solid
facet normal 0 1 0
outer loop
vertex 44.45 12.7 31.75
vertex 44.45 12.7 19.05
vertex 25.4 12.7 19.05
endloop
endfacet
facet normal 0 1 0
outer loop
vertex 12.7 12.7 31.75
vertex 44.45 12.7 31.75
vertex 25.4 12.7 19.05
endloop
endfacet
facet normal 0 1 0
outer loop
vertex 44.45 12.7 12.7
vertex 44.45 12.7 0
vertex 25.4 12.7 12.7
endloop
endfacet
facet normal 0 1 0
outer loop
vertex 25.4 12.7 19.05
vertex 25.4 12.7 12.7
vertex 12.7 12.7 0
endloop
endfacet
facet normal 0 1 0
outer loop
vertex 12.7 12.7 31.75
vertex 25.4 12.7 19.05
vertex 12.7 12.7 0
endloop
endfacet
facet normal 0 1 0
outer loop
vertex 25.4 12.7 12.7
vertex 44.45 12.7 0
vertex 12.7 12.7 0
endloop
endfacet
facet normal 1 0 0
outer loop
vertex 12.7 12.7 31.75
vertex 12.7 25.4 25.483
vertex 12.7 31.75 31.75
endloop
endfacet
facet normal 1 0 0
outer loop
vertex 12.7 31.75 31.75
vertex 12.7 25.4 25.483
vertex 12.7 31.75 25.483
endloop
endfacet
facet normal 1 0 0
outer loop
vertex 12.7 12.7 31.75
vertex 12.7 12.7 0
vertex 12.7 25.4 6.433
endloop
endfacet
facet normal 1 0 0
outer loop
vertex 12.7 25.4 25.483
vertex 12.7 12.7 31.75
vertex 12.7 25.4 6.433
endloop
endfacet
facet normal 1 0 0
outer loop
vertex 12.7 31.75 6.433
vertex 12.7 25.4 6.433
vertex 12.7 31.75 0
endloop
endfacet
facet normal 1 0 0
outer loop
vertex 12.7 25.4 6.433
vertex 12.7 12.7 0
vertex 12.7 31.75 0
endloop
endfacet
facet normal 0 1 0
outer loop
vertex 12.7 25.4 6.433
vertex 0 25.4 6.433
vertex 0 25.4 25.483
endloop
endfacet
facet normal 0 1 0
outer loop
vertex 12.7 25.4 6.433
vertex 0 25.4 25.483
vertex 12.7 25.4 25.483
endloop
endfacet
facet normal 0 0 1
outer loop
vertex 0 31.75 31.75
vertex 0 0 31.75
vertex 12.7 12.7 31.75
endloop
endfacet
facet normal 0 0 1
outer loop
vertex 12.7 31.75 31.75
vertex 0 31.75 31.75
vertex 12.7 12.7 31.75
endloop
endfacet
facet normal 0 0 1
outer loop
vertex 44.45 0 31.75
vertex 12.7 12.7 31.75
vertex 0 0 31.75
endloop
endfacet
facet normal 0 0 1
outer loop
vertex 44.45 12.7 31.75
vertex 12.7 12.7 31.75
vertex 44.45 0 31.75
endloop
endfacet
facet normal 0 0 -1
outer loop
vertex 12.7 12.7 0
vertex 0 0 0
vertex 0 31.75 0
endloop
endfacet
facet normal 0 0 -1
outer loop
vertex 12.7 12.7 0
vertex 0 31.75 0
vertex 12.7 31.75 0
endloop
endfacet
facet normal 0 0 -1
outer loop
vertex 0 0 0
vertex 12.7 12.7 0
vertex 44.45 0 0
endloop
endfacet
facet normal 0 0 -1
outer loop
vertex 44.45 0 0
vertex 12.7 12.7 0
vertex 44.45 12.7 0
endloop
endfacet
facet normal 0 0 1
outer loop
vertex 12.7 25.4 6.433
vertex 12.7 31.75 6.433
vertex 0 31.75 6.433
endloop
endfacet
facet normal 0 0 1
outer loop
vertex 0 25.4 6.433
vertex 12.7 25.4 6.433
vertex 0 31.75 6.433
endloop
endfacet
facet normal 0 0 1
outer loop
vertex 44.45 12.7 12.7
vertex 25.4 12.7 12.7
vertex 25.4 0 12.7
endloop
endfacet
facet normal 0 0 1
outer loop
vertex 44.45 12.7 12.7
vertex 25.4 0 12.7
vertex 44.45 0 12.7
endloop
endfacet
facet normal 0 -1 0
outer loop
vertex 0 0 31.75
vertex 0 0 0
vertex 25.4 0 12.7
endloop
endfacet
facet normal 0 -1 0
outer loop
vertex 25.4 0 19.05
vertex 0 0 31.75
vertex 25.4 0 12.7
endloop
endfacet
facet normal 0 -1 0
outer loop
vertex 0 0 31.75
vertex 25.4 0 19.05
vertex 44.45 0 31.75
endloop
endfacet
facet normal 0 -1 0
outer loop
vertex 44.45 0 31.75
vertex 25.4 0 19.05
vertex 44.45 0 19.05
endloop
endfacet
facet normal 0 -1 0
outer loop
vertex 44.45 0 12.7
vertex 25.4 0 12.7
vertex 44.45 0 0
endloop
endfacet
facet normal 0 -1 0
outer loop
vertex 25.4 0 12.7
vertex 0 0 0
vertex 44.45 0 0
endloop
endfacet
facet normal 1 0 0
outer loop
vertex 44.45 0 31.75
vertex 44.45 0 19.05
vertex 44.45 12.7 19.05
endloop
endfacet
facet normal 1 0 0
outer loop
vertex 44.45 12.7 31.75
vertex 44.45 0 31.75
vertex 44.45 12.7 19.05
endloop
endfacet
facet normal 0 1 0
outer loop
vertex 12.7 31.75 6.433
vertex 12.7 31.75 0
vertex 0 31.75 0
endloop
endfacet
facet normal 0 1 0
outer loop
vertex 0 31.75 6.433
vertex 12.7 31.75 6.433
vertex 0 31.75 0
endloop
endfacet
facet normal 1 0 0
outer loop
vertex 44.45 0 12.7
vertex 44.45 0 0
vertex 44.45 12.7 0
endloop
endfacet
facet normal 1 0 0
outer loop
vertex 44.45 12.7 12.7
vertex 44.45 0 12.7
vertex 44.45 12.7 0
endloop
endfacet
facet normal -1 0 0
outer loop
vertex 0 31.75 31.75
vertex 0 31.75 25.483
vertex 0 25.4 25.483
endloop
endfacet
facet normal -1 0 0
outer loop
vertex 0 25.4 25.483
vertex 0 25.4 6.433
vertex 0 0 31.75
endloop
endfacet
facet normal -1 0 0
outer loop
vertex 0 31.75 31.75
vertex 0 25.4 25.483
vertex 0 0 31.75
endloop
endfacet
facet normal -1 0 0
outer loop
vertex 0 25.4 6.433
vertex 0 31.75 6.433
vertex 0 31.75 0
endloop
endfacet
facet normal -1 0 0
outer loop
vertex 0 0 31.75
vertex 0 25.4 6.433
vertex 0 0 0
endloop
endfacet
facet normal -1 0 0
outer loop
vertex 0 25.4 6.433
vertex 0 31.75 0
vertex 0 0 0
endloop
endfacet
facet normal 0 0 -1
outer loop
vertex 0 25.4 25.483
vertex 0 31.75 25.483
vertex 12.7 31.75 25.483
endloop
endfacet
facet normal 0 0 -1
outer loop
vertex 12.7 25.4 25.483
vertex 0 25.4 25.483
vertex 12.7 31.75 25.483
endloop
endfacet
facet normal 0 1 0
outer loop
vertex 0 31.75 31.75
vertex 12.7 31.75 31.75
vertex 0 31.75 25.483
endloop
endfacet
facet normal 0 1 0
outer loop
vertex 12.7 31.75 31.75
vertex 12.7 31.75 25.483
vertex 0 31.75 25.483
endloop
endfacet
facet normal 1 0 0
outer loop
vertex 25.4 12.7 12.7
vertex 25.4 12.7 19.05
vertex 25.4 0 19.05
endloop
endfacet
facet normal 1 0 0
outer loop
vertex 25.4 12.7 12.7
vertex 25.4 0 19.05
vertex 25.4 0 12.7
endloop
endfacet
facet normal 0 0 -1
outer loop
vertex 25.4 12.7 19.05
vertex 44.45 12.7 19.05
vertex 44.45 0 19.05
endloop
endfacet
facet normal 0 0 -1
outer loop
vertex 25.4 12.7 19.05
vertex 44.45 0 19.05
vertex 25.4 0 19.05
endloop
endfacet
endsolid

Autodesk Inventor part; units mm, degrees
ref_plane "YZ Plane" through (0, 0, 0) normal (1, 0, 0) x (0, 1, 0)
ref_plane "XZ Plane" through (0, 0, 0) normal (0, 1, 0) x (-1, 0, 0)
ref_plane "XY Plane" through (0, 0, 0) normal (0, 0, 1) x (1, 0, 0)
sketch "Sketch1" plane through (0, 0, 0) normal (0, 0, 1) x (1, 0, 0)
  line L0 (0, 0) -> (44.45, 0)
  line L1 (44.45, 0) -> (44.45, 12.7)
  line L2 (44.45, 12.7) -> (12.7, 12.7)
  line L3 (12.7, 12.7) -> (12.7, 31.75)
  line L4 (12.7, 31.75) -> (0, 31.75)
  line L5 (0, 31.75) -> (0, 0)
  dimension "d0" = 44.45
  dimension "d1" = 12.7
  dimension "d2" = 31.75
  dimension "d3" = 19.05
extrude "Extrusion1" add sketch "Sketch1" along normal blind 31.75
sketch "Sketch2" plane through (0, 31.75, 0) normal (0, 1, 0) x (1, 0, 0)
  line L0 (0, -31.8326) -> (0, -25.4826) construction
  line L1 (0, 0) -> (0, -31.75) construction
  line L2 (0, -25.4826) -> (12.7, -25.4826)
  line L3 (12.7, 0) -> (12.7, -31.75) projected
  line L4 (12.7, -25.4826) -> (12.7, -6.4326)
  line L5 (12.7, -6.4326) -> (0, -6.4326)
  line L6 (0, -6.4326) -> (0, -25.4826)
  dimension "d6" = 6.35
  dimension "d7" = 19.05
extrude "Extrusion2" cut sketch "Sketch2" against normal blind 6.35
sketch "Sketch4" plane through (12.7, 12.7, 0) normal (0, 1, 0) x (1, 0, 0)
  line L0 (31.75, 0) -> (31.75, -31.75) construction
  line L1 (31.75, -31.75) -> (31.75, -19.05) construction
  line L2 (31.75, -19.05) -> (12.7, -19.05)
  line L3 (12.7, -19.05) -> (12.7, -12.7)
  line L4 (12.7, -12.7) -> (31.75, -12.7)
  line L5 (31.75, -12.7) -> (31.75, -19.05)
  point P0 (-12.7, 0)
  dimension "d10" = 12.7
  dimension "d11" = 19.05
  dimension "d12" = 6.35
extrude "Extrusion3" cut sketch "Sketch4" against normal blind 19.05
properties part number "Aluminum Part" material "Aluminum 6061"
